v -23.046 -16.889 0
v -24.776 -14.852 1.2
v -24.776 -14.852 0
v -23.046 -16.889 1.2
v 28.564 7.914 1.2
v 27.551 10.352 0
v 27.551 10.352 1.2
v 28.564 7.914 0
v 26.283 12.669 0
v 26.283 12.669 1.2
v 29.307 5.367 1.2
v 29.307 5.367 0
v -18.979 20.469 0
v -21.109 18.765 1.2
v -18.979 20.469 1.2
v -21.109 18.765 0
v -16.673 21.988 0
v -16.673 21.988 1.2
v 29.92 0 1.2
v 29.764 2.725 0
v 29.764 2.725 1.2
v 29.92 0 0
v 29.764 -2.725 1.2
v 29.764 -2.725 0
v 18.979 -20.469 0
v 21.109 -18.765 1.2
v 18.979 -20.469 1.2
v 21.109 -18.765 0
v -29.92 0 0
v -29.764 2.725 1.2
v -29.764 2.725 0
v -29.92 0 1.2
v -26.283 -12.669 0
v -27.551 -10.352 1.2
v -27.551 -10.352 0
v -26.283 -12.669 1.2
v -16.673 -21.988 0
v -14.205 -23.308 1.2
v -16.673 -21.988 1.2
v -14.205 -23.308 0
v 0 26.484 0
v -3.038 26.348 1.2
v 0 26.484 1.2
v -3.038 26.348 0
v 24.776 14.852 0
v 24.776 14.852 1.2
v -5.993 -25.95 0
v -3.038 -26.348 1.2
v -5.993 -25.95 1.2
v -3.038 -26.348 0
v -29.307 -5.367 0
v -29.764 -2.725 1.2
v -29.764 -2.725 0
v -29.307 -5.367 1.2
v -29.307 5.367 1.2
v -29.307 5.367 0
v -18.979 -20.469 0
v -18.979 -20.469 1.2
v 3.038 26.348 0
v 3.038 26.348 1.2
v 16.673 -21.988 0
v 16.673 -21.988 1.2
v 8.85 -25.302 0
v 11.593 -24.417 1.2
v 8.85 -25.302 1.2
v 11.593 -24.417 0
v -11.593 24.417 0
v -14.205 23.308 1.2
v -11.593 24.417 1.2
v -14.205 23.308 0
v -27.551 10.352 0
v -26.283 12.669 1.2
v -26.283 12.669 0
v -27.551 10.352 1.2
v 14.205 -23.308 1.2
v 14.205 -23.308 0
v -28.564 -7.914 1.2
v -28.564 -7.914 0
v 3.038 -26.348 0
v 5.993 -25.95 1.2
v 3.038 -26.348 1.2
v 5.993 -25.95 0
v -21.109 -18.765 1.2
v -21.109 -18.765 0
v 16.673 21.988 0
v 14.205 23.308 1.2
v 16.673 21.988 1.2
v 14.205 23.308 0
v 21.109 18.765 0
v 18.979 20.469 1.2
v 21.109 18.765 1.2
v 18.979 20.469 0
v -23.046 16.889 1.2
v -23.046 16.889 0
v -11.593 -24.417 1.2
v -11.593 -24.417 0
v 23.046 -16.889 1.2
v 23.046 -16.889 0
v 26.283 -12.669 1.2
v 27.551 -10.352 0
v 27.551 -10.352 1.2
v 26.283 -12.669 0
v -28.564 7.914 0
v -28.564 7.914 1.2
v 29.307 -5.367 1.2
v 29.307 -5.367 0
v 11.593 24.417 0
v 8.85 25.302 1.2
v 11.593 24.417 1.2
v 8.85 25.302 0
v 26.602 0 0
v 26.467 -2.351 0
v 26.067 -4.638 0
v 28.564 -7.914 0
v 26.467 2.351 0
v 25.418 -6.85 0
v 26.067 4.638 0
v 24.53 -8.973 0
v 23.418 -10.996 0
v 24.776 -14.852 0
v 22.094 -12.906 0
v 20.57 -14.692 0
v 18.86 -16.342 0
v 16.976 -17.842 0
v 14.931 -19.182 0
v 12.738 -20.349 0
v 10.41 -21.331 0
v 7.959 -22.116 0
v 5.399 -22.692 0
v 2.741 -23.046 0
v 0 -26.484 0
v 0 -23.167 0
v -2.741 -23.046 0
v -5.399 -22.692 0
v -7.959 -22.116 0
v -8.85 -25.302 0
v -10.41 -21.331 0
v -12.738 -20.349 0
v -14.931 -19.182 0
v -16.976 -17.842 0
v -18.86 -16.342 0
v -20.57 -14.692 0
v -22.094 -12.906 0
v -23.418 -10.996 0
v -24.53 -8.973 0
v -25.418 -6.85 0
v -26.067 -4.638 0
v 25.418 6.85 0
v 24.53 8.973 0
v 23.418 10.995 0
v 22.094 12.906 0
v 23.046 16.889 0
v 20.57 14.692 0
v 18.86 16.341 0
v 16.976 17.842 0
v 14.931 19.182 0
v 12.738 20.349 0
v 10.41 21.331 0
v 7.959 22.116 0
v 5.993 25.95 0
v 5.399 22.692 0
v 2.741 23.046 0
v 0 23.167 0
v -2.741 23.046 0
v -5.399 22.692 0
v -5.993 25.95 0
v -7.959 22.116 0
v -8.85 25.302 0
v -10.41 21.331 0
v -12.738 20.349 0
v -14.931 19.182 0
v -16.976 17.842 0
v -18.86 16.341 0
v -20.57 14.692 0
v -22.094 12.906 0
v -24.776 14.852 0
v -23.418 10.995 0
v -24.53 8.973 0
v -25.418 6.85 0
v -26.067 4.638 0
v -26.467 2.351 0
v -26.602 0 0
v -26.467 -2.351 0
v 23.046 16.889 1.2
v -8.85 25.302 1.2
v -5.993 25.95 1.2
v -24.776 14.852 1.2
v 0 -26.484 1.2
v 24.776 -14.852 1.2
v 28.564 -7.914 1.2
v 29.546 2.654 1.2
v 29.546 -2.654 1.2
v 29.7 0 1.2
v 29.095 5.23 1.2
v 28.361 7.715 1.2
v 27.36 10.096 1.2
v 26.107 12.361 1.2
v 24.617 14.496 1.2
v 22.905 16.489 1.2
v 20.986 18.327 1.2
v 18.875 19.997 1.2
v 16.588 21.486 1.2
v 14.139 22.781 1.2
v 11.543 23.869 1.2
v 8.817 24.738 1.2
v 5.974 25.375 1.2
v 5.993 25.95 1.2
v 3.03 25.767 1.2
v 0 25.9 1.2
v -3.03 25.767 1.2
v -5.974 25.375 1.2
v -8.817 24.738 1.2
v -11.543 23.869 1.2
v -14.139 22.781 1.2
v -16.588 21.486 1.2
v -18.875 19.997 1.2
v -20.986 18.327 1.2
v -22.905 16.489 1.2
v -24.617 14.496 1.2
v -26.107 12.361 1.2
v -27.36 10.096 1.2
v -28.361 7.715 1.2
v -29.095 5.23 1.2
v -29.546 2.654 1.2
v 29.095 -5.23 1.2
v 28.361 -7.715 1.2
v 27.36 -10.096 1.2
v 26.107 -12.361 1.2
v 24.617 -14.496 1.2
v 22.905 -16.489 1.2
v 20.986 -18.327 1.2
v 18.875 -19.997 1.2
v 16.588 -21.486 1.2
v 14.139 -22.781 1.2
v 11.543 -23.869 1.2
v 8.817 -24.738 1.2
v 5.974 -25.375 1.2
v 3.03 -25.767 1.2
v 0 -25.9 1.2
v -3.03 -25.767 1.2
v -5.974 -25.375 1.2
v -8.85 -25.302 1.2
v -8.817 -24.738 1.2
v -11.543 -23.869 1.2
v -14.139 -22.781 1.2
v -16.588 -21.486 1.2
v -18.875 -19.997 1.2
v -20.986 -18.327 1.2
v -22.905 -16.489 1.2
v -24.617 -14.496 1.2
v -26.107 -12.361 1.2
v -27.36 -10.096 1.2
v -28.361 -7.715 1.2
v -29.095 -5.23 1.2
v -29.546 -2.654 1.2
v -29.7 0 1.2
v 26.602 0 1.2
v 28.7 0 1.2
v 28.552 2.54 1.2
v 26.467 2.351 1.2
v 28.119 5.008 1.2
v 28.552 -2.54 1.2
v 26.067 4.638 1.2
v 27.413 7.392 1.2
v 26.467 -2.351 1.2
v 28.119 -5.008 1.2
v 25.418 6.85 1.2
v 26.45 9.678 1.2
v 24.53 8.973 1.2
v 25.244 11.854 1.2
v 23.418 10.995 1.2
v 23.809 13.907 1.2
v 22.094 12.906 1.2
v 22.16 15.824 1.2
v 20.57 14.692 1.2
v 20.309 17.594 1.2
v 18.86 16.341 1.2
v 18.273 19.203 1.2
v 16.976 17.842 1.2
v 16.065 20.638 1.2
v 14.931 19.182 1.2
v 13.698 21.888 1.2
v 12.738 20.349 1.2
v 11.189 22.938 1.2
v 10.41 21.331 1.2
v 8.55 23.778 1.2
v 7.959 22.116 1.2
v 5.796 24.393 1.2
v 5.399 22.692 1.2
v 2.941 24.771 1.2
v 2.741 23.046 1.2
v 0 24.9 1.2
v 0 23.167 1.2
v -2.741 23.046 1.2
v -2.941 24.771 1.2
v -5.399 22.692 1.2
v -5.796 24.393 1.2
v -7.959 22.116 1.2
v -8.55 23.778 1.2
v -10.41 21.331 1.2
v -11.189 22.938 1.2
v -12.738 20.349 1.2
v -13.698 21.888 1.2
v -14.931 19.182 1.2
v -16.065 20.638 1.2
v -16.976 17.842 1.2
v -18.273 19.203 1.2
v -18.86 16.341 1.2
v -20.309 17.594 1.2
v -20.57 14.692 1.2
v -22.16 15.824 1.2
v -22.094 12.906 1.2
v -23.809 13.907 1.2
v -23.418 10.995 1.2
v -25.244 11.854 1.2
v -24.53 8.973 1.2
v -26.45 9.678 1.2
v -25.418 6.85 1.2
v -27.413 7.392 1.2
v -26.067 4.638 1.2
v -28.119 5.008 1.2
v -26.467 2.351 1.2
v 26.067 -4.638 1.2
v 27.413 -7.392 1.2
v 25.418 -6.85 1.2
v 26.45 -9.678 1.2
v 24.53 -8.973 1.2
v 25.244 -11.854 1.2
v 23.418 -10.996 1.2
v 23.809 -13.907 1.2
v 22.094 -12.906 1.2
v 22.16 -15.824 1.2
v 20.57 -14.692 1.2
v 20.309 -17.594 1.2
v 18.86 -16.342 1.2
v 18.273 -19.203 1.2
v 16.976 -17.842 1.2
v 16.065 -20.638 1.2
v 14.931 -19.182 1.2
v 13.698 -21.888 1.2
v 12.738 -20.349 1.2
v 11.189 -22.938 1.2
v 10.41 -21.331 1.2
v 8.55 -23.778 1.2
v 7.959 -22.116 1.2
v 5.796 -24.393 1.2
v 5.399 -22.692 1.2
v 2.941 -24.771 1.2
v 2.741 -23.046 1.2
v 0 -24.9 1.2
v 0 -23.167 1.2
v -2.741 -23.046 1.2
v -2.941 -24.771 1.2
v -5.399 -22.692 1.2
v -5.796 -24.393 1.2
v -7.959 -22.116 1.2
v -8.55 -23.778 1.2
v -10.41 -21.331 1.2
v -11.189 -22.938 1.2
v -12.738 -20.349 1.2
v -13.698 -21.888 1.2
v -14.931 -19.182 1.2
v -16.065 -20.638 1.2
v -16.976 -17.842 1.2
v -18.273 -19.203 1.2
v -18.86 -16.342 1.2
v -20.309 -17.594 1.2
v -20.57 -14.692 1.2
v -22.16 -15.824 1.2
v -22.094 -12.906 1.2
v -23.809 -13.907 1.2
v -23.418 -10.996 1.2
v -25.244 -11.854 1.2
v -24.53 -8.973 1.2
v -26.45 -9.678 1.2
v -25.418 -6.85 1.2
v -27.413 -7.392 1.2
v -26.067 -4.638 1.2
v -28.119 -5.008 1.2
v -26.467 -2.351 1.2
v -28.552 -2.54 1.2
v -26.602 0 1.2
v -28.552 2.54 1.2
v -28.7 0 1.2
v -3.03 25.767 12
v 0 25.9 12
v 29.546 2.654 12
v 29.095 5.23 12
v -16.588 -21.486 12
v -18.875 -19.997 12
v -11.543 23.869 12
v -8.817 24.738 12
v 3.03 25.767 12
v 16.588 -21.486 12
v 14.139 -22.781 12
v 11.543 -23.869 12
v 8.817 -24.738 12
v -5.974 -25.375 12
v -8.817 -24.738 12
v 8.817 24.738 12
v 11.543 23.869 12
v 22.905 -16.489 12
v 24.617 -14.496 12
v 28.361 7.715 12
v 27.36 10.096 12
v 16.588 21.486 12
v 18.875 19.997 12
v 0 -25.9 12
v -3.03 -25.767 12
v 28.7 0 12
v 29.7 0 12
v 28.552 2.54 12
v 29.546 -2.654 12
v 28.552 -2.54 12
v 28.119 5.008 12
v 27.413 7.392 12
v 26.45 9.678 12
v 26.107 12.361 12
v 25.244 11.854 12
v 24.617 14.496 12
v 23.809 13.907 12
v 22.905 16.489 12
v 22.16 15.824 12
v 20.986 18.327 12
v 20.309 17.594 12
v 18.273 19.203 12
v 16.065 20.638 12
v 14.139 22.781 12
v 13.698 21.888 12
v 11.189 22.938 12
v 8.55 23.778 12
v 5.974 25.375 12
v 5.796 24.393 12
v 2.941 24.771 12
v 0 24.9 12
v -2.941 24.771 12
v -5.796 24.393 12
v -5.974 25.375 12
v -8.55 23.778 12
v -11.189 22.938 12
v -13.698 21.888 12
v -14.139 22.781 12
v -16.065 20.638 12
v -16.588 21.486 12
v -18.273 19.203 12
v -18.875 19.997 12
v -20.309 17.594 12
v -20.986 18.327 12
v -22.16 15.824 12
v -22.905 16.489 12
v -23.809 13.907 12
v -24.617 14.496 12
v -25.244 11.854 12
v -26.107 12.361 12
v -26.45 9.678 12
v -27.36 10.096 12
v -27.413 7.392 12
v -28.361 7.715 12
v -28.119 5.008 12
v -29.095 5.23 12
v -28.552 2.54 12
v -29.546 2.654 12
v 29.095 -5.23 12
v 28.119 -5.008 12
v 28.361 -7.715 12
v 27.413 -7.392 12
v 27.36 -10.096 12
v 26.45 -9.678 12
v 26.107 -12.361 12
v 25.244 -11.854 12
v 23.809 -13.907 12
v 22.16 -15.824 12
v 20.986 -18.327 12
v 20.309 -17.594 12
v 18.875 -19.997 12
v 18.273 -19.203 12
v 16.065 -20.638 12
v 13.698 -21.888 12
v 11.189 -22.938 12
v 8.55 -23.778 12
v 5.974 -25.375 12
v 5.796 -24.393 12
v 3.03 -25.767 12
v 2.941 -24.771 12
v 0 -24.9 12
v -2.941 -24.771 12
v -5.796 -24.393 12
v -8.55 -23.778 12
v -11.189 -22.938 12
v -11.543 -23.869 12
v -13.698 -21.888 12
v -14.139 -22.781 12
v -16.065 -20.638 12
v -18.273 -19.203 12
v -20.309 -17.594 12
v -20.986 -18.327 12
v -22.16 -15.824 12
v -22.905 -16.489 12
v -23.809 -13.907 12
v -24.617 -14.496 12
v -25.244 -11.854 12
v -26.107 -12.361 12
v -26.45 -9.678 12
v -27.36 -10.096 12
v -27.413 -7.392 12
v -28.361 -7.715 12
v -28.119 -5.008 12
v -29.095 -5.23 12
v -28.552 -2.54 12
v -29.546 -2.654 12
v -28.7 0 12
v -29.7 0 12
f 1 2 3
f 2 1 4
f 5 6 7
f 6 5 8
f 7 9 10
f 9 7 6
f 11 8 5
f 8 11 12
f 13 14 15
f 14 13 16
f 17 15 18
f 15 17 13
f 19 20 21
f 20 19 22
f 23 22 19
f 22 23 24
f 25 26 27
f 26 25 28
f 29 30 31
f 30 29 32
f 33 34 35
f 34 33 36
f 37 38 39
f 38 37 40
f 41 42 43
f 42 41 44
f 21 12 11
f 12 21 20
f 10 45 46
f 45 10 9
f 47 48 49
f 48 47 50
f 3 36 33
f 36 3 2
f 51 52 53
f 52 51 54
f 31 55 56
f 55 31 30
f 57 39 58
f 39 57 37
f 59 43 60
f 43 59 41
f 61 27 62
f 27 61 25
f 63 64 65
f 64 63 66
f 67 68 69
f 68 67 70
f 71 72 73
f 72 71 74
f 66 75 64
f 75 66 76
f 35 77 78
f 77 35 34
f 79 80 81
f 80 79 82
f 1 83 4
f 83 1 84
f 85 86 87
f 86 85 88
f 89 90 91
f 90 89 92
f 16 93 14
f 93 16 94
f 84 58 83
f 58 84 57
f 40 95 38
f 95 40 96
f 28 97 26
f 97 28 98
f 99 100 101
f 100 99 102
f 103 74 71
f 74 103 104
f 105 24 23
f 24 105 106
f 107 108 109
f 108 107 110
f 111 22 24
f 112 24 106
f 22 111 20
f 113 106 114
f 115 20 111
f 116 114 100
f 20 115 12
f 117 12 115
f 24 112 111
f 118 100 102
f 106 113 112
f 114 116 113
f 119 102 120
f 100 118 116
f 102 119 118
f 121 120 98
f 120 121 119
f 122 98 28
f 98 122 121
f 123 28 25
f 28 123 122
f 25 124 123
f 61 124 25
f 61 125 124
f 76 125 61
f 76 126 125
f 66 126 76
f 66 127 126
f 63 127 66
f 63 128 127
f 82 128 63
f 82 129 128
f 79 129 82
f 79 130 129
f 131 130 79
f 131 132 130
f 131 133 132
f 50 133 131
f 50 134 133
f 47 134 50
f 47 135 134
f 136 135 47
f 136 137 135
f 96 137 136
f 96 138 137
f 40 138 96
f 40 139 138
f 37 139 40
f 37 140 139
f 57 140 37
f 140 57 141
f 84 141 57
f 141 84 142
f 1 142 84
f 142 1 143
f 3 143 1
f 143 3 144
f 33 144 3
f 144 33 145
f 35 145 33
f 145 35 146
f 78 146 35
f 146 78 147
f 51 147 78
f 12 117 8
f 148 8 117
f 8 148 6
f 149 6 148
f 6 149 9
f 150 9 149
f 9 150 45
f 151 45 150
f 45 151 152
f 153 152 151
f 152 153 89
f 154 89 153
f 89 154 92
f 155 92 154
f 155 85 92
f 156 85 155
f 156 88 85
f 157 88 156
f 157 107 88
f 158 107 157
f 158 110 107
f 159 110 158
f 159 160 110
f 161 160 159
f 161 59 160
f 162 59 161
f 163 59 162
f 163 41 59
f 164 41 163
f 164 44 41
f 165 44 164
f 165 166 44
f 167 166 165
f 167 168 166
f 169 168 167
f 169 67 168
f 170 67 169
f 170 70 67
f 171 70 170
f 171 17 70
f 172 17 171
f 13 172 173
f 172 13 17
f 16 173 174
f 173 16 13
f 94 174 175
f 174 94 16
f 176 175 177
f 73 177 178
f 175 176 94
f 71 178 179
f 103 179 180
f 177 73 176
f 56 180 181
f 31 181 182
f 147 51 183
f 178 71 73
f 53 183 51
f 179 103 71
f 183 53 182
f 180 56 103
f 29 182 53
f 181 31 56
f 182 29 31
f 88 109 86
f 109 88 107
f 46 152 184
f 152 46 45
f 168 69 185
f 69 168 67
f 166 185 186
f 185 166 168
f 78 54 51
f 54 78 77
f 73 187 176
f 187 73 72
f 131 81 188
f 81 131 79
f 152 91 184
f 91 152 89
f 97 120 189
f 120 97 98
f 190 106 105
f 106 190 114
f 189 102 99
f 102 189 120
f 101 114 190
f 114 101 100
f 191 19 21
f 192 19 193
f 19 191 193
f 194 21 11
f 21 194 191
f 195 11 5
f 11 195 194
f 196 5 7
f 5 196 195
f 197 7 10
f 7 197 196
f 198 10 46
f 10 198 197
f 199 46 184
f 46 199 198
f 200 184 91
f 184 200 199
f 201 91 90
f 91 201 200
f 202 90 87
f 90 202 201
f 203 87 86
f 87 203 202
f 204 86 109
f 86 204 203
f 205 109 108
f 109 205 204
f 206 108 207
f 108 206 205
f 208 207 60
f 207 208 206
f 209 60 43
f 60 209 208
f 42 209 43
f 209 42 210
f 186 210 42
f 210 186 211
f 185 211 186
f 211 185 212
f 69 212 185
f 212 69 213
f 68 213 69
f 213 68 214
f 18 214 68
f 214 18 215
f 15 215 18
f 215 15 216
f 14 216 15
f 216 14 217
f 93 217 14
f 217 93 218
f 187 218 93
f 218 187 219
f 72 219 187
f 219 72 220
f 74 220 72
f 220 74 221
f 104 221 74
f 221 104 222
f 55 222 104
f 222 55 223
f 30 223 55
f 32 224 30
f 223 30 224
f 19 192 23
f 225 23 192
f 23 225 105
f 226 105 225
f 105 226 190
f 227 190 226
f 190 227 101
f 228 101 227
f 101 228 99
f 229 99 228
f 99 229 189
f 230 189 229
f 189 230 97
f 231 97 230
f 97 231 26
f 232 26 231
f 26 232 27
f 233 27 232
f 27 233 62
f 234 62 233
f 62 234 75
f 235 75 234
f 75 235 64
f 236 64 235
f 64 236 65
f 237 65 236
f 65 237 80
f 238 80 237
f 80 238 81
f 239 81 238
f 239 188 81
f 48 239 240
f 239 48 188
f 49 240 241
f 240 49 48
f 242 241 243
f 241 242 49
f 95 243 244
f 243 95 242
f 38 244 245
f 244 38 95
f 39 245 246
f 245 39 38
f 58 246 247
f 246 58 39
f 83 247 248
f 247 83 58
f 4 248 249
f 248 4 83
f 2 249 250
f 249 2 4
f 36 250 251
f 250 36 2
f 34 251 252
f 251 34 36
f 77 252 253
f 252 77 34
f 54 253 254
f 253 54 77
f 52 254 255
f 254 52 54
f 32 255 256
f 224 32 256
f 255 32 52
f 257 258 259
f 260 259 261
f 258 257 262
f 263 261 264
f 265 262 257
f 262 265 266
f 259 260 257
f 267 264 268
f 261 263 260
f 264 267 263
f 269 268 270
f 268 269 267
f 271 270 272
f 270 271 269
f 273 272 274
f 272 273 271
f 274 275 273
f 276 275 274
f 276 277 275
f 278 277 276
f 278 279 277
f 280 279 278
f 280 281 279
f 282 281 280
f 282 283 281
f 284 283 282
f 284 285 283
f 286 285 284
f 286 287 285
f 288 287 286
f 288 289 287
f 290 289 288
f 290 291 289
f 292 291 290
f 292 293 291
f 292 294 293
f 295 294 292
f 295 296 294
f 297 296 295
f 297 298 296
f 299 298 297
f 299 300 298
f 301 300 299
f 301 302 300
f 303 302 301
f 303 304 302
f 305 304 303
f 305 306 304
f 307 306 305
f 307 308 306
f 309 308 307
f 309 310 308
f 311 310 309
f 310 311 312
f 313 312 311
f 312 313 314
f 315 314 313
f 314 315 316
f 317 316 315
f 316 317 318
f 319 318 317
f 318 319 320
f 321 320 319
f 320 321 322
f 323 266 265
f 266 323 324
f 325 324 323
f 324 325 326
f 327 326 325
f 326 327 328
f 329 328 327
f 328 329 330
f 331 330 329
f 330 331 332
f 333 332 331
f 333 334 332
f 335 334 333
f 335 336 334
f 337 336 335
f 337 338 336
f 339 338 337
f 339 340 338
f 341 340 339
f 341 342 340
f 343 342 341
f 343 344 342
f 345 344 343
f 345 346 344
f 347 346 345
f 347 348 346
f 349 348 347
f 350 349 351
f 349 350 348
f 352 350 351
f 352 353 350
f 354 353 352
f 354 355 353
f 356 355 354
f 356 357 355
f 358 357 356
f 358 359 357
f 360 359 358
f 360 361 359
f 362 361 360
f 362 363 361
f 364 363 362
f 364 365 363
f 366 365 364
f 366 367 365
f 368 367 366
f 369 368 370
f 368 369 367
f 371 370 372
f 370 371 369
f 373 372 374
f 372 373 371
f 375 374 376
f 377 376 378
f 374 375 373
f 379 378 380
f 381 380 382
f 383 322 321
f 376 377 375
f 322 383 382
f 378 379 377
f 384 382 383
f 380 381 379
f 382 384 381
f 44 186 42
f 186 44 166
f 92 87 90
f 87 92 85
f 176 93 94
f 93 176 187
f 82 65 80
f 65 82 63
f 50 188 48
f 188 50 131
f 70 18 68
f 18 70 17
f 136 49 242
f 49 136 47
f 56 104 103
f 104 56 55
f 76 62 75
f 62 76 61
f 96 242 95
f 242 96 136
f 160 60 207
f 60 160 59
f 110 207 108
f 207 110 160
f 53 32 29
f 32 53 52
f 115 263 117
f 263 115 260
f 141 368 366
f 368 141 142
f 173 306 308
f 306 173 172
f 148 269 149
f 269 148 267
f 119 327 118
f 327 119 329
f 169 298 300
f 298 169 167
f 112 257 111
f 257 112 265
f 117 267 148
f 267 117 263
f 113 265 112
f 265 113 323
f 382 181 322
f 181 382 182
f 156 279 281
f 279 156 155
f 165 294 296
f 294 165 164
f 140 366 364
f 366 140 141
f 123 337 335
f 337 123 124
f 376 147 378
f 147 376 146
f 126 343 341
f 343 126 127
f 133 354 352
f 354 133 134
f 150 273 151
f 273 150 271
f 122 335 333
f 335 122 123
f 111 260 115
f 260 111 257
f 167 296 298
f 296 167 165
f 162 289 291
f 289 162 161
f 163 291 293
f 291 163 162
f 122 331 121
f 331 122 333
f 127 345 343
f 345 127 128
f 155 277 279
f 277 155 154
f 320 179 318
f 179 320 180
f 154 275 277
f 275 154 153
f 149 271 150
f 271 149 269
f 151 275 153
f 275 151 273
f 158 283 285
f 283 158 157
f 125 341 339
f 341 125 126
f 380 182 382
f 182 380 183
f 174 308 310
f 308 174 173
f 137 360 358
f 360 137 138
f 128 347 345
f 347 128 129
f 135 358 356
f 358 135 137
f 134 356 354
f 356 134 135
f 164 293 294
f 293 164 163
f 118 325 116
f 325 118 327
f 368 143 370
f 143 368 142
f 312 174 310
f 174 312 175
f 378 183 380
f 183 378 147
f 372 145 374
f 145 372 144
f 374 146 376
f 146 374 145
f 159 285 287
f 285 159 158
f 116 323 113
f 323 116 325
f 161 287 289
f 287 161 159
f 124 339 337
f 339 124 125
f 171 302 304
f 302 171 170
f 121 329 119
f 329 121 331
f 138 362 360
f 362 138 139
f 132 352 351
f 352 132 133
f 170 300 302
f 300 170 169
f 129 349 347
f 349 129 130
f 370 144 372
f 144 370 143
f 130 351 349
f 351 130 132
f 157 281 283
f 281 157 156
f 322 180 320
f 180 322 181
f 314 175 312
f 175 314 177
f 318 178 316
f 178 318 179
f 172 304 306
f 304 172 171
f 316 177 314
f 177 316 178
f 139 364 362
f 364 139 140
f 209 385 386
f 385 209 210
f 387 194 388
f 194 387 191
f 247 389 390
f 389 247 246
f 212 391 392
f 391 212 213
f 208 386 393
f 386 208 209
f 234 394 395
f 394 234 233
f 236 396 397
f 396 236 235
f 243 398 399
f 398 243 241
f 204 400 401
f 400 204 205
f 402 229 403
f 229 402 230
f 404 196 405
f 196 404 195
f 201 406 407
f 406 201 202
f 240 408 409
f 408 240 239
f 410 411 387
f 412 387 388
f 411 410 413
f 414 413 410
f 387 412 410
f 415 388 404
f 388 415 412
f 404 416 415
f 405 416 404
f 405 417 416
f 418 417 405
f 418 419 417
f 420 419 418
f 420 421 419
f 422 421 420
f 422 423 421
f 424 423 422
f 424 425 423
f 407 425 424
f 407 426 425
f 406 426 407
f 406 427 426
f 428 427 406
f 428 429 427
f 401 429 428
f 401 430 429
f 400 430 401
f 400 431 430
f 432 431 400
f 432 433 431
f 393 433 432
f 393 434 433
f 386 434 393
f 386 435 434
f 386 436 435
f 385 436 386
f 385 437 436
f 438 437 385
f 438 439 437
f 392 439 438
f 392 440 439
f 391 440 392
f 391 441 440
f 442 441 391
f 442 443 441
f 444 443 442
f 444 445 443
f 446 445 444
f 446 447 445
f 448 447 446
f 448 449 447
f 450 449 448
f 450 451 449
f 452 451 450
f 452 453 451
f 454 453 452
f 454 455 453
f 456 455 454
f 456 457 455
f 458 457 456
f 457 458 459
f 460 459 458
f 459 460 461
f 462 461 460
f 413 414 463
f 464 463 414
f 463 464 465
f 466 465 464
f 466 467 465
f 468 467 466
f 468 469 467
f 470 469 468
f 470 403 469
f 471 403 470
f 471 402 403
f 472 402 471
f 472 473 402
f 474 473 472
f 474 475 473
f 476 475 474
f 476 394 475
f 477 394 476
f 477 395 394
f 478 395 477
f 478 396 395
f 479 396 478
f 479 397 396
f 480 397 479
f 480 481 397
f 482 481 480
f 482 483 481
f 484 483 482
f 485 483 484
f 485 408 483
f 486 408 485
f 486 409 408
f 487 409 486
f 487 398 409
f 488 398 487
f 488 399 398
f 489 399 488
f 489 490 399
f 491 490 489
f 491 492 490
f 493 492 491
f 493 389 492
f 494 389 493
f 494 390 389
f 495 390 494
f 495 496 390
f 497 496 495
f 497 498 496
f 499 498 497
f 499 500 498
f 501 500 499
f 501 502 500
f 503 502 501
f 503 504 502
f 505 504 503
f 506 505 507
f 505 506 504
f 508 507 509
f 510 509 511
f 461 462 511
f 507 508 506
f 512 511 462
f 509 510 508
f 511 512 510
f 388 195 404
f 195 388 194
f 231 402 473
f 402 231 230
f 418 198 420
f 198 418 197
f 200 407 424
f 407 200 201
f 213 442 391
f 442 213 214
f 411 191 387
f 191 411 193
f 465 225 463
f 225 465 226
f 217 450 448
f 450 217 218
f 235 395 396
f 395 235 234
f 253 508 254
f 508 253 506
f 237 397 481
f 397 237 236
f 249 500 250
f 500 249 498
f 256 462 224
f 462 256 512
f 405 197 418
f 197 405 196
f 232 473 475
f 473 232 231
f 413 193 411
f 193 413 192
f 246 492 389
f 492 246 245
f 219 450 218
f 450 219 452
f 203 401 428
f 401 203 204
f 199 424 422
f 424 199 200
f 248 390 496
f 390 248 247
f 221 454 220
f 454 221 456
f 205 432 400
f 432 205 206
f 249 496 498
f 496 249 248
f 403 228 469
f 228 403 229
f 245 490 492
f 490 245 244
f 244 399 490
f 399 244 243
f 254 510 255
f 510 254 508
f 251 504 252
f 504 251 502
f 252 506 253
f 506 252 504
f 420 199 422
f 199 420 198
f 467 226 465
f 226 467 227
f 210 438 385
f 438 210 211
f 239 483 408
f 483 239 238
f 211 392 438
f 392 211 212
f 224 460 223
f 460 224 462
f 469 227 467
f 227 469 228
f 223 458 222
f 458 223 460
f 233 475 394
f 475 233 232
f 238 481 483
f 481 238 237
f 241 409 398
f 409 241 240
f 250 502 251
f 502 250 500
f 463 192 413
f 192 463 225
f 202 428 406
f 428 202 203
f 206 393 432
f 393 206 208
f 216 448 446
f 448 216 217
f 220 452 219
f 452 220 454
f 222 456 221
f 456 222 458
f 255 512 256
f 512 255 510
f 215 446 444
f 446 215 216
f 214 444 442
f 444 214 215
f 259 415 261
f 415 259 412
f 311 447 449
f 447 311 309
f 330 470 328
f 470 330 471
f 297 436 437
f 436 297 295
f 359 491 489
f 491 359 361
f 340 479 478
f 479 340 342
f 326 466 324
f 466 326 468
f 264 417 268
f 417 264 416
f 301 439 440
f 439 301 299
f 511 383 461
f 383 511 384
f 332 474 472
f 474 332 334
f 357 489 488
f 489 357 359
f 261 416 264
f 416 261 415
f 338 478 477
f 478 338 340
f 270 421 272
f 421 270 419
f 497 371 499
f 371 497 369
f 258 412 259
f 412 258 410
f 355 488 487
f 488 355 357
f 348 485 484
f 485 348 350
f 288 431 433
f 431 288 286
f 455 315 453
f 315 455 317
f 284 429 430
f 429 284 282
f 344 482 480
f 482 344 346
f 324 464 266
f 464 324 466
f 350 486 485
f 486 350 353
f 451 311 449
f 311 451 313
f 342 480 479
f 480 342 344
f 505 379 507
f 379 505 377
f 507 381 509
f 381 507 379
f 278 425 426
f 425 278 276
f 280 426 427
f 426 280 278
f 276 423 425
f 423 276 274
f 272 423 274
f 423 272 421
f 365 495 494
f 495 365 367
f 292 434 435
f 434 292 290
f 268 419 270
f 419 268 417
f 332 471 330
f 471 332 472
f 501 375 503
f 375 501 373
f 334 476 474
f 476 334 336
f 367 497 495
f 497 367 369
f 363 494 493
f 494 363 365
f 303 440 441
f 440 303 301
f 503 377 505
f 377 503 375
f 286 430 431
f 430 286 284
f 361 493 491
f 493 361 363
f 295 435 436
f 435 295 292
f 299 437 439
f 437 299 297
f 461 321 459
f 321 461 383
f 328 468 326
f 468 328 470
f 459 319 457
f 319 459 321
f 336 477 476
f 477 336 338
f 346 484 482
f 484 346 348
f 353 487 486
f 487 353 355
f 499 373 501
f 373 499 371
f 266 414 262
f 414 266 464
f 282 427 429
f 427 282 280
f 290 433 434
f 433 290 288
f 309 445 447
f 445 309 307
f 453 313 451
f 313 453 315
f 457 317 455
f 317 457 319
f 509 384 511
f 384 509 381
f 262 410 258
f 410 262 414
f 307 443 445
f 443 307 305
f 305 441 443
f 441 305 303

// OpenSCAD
// file: makkurokursukeA_02.scad
// Module names are of the form poly_<inkscape-path-id>().  As a result,
// you can associate a polygon in this OpenSCAD program with the corresponding
// SVG element in the Inkscape document by looking for the XML element with
// the attribute id="inkscape-path-id".

// fudge value is used to ensure that subtracted solids are a tad taller
// in the z dimension than the polygon being subtracted from.  This helps
// keep the resulting .stl file manifold.
fudge = 0.1;

module poly_path4146(h)
{
  scale([25.4/90, -25.4/90, 1]) union()
  {
    difference()
    {
       linear_extrude(height=h)
         polygon([[-0.000000,-91.771486],[-10.735807,-91.299024],[-21.166984,-89.912034],[-31.239993,-87.656106],[-40.901297,-84.576833],[-50.097359,-80.719807],[-58.774641,-76.130619],[-66.879606,-70.854860],[-74.358716,-64.938123],[-81.158434,-58.425999],[-87.225223,-51.364080],[-92.505544,-43.797957],[-96.945860,-35.773223],[-100.492634,-27.335468],[-103.092329,-18.530285],[-104.691407,-9.403266],[-105.236330,-0.000001],[-104.691407,9.403263],[-103.092329,18.530283],[-100.492634,27.335466],[-96.945860,35.773221],[-92.505544,43.797956],[-87.225223,51.364079],[-81.158434,58.425998],[-74.358716,64.938122],[-66.879606,70.854860],[-58.774641,76.130618],[-50.097359,80.719807],[-40.901297,84.576833],[-31.239993,87.656106],[-21.166984,89.912034],[-10.735807,91.299024],[-0.000000,91.771486],[10.735806,91.299024],[21.166982,89.912034],[31.239991,87.656106],[40.901295,84.576833],[50.097357,80.719807],[58.774639,76.130618],[66.879604,70.854860],[74.358715,64.938122],[81.158433,58.425998],[87.225221,51.364079],[92.505543,43.797956],[96.945859,35.773221],[100.492634,27.335466],[103.092329,18.530283],[104.691407,9.403263],[105.236330,-0.000001],[104.691407,-9.403266],[103.092329,-18.530285],[100.492634,-27.335468],[96.945859,-35.773223],[92.505543,-43.797957],[87.225221,-51.364080],[81.158433,-58.425999],[74.358715,-64.938123],[66.879604,-70.854860],[58.774639,-76.130619],[50.097357,-80.719807],[40.901295,-84.576834],[31.239991,-87.656106],[21.166982,-89.912034],[10.735806,-91.299024],[-0.000000,-91.771486]]);
       translate([0, 0, -fudge])
         linear_extrude(height=h+2*fudge)
           polygon([[-0.000000,-88.228517],[10.421511,-87.771659],[20.536495,-86.431009],[30.294475,-84.251453],[39.644972,-81.277877],[48.537508,-77.555168],[56.921607,-73.128211],[64.746789,-68.041893],[71.962577,-62.341100],[78.518494,-56.070719],[84.364060,-49.275635],[89.448800,-42.000734],[93.722234,-34.290903],[97.133885,-26.191028],[99.633274,-17.745996],[101.169925,-9.000691],[101.693360,-0.000001],[101.169925,9.000688],[99.633274,17.745992],[97.133885,26.191025],[93.722234,34.290900],[89.448800,42.000730],[84.364060,49.275631],[78.518494,56.070715],[71.962577,62.341097],[64.746789,68.041890],[56.921607,73.128208],[48.537508,77.555165],[39.644972,81.277875],[30.294475,84.251451],[20.536495,86.431007],[10.421511,87.771657],[-0.000000,88.228516],[-10.421512,87.771657],[-20.536497,86.431007],[-30.294477,84.251451],[-39.644975,81.277875],[-48.537511,77.555165],[-56.921610,73.128208],[-64.746792,68.041890],[-71.962580,62.341097],[-78.518496,56.070715],[-84.364063,49.275631],[-89.448802,42.000730],[-93.722236,34.290900],[-97.133886,26.191025],[-99.633276,17.745992],[-101.169927,9.000688],[-101.693361,-0.000001],[-101.169927,-9.000691],[-99.633276,-17.745996],[-97.133886,-26.191028],[-93.722236,-34.290903],[-89.448802,-42.000734],[-84.364063,-49.275635],[-78.518496,-56.070719],[-71.962580,-62.341100],[-64.746792,-68.041893],[-56.921610,-73.128211],[-48.537511,-77.555168],[-39.644975,-81.277877],[-30.294477,-84.251453],[-20.536497,-86.431009],[-10.421512,-87.771659],[-0.000000,-88.228517]]);
    }
  }
}

poly_path4146(12);
// file: makkurokursukeA_01.scad
// Module names are of the form poly_<inkscape-path-id>().  As a result,
// you can associate a polygon in this OpenSCAD program with the corresponding
// SVG element in the Inkscape document by looking for the XML element with
// the attribute id="inkscape-path-id".

// fudge value is used to ensure that subtracted solids are a tad taller
// in the z dimension than the polygon being subtracted from.  This helps
// keep the resulting .stl file manifold.
fudge = 0.1;

module poly_path4325(h)
{
  scale([25.4/90, -25.4/90, 1]) union()
  {
    difference()
    {
       linear_extrude(height=h)
         polygon([[-0.000000,-93.840266],[-10.765294,-93.359776],[-21.236569,-91.948685],[-31.358562,-89.652565],[-41.076009,-86.516986],[-50.333645,-82.587519],[-59.076206,-77.909735],[-67.248428,-72.529204],[-74.795047,-66.491497],[-81.660798,-59.842185],[-87.790417,-52.626839],[-93.128640,-44.891029],[-97.620203,-36.680326],[-101.209842,-28.040301],[-103.842292,-19.016525],[-105.462289,-9.654568],[-106.014569,-0.000001],[-105.462289,9.654567],[-103.842292,19.016524],[-101.209842,28.040301],[-97.620203,36.680326],[-93.128640,44.891029],[-87.790417,52.626839],[-81.660798,59.842185],[-74.795047,66.491497],[-67.248428,72.529204],[-59.076206,77.909735],[-50.333645,82.587519],[-41.076009,86.516986],[-31.358562,89.652565],[-21.236569,91.948685],[-10.765294,93.359776],[-0.000000,93.840266],[10.765294,93.359776],[21.236569,91.948685],[31.358562,89.652565],[41.076008,86.516986],[50.333644,82.587519],[59.076204,77.909735],[67.248426,72.529204],[74.795044,66.491497],[81.660795,59.842185],[87.790414,52.626839],[93.128637,44.891029],[97.620200,36.680326],[101.209839,28.040301],[103.842290,19.016524],[105.462288,9.654567],[106.014569,-0.000001],[105.462289,-9.654568],[103.842292,-19.016525],[101.209842,-28.040301],[97.620203,-36.680326],[93.128640,-44.891029],[87.790417,-52.626839],[81.660798,-59.842185],[74.795047,-66.491497],[67.248428,-72.529204],[59.076206,-77.909735],[50.333645,-82.587519],[41.076009,-86.516986],[31.358562,-89.652565],[21.236569,-91.948685],[10.765294,-93.359776],[-0.000000,-93.840266]]);
       translate([0, 0, -fudge])
         linear_extrude(height=h+2*fudge)
           polygon([[-0.000000,-82.086334],[9.713790,-81.658393],[19.129542,-80.403182],[28.201906,-78.363616],[36.885534,-75.582612],[45.135076,-72.103087],[52.905185,-67.967957],[60.150511,-63.220138],[66.825704,-57.902547],[72.885417,-52.058101],[78.284300,-45.729715],[82.977004,-38.960307],[86.918181,-31.792793],[90.062482,-24.270088],[92.364557,-16.435111],[93.779058,-8.330776],[94.260636,-0.000001],[93.779057,8.330790],[92.364554,16.435166],[90.062476,24.270207],[86.918171,31.792993],[82.976990,38.960603],[78.284281,45.730118],[72.885394,52.058618],[66.825677,57.903182],[60.150481,63.220890],[52.905154,67.968822],[45.135045,72.104059],[36.885504,75.583679],[28.201879,78.364763],[19.129521,80.404391],[9.713778,81.659643],[-0.000000,82.087598],[-9.713778,81.659643],[-19.129521,80.404391],[-28.201879,78.364763],[-36.885504,75.583679],[-45.135045,72.104059],[-52.905154,67.968822],[-60.150481,63.220890],[-66.825677,57.903182],[-72.885394,52.058618],[-78.284281,45.730118],[-82.976990,38.960603],[-86.918171,31.792993],[-90.062476,24.270207],[-92.364554,16.435166],[-93.779057,8.330790],[-94.260636,-0.000001],[-93.779058,-8.330776],[-92.364557,-16.435111],[-90.062482,-24.270088],[-86.918181,-31.792793],[-82.977004,-38.960307],[-78.284300,-45.729715],[-72.885417,-52.058101],[-66.825704,-57.902547],[-60.150511,-63.220138],[-52.905185,-67.967957],[-45.135076,-72.103087],[-36.885534,-75.582612],[-28.201906,-78.363616],[-19.129542,-80.403182],[-9.713790,-81.658393],[-0.000000,-82.086334]]);
    }
  }
}

poly_path4325(1.2000000476837158);
// main file
include <makkurokursukeA_01.scad>
include <makkurokursukeA_02.scad>
//include <makkurokursukeB_01.scad>
//include <makkurokursukeB_02.scad>
